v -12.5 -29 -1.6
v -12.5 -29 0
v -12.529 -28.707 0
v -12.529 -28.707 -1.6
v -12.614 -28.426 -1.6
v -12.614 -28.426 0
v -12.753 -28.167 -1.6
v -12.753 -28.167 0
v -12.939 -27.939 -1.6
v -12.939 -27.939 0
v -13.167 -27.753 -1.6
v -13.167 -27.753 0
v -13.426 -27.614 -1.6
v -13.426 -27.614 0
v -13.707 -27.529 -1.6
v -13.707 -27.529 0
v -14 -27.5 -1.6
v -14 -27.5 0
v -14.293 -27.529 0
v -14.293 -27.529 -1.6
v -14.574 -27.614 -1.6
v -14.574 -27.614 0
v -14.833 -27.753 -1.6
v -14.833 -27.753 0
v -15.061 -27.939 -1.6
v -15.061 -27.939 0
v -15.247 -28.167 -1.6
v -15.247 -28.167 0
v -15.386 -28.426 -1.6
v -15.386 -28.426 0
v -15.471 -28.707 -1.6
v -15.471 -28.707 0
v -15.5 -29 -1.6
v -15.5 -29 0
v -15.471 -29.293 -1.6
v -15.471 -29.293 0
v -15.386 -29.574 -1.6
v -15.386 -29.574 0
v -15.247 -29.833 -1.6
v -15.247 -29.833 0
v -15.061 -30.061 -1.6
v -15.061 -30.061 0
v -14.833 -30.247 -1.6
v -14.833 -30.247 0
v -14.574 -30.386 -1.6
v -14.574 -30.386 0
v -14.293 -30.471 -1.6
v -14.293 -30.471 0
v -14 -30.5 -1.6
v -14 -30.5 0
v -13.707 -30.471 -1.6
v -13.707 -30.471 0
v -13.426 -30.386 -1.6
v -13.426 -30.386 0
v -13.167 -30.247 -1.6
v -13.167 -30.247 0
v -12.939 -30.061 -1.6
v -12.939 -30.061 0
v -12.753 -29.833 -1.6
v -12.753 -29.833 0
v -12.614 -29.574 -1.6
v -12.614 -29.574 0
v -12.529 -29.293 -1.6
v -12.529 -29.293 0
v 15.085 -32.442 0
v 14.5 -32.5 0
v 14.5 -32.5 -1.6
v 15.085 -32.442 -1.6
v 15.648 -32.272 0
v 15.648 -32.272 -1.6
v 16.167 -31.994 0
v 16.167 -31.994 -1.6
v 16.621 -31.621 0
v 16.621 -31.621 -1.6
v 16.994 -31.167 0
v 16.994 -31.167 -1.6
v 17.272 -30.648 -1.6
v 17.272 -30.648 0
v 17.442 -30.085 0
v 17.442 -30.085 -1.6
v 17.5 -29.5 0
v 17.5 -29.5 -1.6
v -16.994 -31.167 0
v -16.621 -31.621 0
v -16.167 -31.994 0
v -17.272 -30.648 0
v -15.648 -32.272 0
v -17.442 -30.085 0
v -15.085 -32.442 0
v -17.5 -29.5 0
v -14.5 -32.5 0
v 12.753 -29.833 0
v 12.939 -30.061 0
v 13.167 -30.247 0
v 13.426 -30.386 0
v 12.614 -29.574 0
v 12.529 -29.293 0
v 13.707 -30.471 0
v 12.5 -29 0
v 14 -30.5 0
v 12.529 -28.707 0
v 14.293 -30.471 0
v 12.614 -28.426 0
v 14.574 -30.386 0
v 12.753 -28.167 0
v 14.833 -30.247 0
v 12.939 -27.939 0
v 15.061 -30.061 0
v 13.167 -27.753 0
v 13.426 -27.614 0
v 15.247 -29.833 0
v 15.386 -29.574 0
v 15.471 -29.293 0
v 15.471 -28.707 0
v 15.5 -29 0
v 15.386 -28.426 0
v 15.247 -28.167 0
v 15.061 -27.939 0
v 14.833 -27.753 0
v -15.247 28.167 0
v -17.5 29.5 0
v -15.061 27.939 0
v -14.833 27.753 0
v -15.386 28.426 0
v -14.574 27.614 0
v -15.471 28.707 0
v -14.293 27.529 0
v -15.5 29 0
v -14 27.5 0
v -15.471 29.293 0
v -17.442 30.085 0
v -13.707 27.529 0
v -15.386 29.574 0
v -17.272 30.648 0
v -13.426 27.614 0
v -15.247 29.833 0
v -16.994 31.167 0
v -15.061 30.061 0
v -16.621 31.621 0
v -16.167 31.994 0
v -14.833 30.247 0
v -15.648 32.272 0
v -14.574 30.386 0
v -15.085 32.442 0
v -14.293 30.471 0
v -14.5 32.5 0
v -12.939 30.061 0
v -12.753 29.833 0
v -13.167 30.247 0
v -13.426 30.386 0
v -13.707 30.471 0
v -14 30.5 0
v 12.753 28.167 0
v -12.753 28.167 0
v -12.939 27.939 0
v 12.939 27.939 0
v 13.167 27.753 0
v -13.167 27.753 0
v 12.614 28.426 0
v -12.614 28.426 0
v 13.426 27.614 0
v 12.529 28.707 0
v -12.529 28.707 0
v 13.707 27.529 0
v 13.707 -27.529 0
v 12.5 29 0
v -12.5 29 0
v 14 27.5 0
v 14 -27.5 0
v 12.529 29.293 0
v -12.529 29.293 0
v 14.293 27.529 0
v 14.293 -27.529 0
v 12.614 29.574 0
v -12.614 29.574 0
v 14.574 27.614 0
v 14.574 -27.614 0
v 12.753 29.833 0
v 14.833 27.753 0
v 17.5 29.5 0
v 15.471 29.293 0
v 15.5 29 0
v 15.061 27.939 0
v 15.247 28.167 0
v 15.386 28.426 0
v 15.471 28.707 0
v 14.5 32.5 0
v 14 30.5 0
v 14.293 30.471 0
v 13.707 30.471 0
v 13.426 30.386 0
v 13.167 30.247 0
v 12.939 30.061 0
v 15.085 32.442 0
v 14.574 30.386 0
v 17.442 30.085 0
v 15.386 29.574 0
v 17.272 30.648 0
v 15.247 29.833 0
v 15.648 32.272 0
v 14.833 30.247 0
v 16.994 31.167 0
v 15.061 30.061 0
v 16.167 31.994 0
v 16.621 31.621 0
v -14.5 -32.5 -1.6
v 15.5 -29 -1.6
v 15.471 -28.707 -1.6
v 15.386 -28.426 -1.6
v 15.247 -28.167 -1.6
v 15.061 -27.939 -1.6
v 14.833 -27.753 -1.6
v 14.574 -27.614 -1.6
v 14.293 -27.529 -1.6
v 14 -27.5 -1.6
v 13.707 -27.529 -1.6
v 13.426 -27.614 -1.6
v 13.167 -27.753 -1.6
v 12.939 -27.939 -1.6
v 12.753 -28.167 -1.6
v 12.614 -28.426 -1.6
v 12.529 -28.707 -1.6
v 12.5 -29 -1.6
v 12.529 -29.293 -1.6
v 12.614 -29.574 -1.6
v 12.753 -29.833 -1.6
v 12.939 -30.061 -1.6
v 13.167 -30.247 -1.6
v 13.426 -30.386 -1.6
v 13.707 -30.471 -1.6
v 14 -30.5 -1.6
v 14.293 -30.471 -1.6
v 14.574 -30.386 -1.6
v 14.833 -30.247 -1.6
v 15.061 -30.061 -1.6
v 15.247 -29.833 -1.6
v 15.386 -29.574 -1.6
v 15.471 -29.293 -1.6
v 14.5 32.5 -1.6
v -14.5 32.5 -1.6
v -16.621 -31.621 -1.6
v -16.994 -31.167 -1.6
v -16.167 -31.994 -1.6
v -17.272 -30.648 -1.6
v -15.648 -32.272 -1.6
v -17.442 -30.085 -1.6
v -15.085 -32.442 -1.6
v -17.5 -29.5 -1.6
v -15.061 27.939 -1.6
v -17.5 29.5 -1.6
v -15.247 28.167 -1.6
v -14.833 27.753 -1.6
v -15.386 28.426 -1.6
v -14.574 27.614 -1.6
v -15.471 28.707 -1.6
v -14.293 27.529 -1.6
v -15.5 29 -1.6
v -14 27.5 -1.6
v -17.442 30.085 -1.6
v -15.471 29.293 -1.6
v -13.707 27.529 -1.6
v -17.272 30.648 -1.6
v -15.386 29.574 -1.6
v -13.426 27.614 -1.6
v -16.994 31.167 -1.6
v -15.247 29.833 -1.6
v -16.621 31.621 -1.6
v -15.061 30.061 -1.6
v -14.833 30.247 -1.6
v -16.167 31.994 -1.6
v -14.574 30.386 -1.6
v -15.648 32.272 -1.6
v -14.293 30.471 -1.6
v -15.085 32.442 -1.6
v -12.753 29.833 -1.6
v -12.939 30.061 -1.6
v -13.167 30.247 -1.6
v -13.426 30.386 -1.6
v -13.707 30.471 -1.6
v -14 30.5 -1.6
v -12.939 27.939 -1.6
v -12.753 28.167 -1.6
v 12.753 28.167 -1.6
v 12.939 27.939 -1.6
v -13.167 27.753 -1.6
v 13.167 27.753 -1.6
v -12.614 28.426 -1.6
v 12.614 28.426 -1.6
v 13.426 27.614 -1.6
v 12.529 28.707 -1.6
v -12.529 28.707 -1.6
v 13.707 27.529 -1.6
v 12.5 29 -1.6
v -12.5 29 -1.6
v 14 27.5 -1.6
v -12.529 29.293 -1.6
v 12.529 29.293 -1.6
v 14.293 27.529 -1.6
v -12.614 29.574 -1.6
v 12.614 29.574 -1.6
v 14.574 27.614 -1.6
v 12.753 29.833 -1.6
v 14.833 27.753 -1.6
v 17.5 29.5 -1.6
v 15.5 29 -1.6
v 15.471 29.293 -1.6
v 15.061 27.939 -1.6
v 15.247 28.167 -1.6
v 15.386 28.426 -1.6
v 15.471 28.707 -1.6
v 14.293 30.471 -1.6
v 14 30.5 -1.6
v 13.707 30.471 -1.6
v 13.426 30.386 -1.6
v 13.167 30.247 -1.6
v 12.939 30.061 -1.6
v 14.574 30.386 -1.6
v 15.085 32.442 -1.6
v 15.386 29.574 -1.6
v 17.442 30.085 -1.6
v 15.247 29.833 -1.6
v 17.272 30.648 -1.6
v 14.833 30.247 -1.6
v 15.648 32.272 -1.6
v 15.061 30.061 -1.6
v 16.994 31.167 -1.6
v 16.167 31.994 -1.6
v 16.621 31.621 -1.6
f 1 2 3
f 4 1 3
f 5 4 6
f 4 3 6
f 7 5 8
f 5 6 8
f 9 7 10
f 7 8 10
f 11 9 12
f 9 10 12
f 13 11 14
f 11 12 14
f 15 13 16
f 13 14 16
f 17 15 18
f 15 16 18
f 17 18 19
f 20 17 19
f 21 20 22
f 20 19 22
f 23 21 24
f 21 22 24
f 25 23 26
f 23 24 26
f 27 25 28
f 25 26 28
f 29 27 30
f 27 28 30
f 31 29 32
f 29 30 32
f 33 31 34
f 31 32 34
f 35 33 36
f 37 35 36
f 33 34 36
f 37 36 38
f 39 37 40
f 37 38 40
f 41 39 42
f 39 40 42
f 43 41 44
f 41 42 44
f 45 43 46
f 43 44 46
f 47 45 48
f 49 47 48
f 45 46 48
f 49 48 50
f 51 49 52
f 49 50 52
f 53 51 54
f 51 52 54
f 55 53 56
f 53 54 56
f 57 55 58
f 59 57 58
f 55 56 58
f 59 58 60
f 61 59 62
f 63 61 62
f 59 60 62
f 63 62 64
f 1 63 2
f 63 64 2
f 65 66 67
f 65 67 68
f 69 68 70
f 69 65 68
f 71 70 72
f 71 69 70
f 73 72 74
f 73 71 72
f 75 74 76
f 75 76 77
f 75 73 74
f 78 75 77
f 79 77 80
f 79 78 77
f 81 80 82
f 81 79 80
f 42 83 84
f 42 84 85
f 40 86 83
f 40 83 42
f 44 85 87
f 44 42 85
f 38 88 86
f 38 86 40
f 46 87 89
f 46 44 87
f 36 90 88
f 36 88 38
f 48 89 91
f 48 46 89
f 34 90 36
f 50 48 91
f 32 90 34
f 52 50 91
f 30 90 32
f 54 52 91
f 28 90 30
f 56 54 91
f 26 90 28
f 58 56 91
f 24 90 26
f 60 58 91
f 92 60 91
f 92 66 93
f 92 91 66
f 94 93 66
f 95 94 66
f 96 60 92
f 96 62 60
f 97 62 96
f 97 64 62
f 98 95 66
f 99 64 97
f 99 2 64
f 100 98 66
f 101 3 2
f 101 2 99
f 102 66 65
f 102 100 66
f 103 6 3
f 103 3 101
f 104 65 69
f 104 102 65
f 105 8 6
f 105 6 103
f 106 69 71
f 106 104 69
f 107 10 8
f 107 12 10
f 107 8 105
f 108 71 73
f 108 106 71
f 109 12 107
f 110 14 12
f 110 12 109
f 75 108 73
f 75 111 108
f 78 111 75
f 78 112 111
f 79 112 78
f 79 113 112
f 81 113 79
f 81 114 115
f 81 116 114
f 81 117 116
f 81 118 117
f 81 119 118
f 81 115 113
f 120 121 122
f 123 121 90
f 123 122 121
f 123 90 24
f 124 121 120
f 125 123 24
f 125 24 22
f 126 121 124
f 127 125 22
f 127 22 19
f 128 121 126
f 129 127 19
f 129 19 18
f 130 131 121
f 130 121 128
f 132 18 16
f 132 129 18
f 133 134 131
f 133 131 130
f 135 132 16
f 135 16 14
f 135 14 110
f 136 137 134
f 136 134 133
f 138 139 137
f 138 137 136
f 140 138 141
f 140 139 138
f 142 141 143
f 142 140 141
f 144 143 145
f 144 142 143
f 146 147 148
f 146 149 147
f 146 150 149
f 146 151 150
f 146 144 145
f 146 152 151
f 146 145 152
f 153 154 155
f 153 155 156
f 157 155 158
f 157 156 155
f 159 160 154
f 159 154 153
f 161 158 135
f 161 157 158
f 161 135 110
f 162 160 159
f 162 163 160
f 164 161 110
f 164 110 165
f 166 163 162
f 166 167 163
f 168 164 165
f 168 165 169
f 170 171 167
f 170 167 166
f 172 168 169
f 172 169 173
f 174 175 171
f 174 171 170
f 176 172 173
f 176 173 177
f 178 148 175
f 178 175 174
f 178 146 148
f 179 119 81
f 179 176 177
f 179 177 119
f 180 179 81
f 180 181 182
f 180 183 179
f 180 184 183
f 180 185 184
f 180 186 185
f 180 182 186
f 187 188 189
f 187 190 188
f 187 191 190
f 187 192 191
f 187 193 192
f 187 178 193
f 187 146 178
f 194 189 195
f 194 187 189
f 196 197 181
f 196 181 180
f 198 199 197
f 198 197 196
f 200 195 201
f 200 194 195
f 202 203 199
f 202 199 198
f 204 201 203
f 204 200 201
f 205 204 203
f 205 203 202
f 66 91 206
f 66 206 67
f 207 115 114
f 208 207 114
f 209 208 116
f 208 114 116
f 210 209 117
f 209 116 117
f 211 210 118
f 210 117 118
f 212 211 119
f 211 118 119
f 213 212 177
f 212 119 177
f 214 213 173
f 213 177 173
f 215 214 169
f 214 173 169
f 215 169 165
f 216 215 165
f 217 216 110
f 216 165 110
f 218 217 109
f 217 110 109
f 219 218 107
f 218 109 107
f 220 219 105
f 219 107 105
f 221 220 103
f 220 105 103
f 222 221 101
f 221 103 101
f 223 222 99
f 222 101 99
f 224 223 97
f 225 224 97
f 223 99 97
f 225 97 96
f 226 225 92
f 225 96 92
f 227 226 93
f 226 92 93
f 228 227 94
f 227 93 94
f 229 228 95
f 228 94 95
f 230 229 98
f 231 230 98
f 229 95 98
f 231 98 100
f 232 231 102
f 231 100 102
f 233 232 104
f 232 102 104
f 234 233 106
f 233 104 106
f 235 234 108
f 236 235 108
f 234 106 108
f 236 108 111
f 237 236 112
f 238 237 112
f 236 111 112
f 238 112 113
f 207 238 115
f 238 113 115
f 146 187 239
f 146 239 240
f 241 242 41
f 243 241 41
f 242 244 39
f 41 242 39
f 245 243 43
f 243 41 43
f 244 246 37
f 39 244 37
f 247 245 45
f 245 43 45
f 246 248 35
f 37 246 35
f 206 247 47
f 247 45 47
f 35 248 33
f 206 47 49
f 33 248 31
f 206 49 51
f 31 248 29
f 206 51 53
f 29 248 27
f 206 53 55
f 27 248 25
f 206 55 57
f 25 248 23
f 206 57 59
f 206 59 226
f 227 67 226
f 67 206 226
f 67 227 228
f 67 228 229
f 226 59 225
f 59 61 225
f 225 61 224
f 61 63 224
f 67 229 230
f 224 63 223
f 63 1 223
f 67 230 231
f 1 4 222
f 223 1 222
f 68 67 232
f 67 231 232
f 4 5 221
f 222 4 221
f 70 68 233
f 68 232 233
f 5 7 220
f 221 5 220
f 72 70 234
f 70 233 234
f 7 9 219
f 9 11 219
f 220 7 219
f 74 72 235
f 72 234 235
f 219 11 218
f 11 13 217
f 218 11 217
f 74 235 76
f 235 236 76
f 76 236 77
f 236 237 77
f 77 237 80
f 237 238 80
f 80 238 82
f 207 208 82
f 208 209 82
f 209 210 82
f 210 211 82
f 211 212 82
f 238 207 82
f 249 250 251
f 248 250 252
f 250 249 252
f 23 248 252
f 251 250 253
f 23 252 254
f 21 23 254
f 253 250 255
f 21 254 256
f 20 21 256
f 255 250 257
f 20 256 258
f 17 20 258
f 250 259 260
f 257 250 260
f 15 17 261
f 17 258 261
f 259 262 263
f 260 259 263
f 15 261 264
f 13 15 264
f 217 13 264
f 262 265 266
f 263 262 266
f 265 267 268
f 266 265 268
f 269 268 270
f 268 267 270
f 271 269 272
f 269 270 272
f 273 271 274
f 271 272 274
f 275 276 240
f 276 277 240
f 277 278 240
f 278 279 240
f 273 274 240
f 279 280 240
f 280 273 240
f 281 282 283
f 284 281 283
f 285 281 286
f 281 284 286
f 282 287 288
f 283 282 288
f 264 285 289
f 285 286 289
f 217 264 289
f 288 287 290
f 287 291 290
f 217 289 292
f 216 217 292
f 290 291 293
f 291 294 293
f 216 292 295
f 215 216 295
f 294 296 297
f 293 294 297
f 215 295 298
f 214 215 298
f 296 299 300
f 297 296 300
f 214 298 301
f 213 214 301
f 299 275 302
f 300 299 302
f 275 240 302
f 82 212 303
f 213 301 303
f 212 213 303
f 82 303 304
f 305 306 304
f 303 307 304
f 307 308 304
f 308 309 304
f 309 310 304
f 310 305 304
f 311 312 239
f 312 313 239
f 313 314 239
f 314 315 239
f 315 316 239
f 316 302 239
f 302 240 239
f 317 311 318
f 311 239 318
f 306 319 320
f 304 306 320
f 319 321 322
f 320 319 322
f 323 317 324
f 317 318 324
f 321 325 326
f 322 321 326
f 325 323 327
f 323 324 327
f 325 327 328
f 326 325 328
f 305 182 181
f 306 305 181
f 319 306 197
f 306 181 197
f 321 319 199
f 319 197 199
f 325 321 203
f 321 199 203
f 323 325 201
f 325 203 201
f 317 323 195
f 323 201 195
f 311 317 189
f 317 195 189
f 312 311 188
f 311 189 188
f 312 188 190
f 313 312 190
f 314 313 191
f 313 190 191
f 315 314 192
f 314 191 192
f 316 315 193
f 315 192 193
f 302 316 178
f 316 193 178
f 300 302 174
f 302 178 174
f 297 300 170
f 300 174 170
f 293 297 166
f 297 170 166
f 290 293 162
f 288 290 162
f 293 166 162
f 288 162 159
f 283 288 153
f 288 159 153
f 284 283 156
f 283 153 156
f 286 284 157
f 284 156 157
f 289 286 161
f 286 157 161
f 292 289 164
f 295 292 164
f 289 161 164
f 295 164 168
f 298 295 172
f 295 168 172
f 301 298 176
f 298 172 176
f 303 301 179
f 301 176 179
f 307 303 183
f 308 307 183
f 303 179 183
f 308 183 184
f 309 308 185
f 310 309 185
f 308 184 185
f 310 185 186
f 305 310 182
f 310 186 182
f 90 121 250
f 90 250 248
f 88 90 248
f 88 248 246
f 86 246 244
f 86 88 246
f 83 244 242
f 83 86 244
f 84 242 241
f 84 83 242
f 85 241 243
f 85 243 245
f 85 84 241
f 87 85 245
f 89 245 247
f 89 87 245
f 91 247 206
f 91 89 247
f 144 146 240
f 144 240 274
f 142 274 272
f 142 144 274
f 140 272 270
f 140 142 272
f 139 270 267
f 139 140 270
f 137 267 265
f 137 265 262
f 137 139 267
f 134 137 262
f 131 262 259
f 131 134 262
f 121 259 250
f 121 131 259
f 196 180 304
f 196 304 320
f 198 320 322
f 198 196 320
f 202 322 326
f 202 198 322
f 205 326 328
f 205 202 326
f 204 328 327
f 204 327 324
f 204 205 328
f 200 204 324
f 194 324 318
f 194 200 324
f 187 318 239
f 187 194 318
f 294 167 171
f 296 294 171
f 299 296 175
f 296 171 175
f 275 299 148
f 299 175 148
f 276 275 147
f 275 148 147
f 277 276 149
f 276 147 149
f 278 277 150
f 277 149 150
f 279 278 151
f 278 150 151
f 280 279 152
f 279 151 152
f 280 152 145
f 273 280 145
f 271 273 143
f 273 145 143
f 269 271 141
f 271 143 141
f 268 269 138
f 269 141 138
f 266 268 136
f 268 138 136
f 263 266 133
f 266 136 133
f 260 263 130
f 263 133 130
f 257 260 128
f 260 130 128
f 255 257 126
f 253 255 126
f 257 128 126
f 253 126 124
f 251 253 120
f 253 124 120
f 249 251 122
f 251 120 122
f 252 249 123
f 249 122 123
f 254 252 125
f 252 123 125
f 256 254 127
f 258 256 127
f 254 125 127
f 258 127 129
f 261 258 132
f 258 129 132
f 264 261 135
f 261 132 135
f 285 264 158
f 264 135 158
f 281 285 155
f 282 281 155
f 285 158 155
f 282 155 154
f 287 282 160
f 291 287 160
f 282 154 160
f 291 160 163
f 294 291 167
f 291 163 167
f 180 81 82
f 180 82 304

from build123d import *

# Parameters (mm, degrees)
F0_R     = 1.5
F1_DEPTH = 1.6


with BuildPart() as f1:
    # F0 (on Top) → F1 (new body)
    with BuildSketch(Plane.XY):
        with BuildLine():
            ThreePointArc((17.5, 29.5), (16.62132, 31.62132), (14.5, 32.5))
            Line((14.5, 32.5), (-14.5, 32.5))
            ThreePointArc((-14.5, 32.5), (-16.62132, 31.62132), (-17.5, 29.5))
            Line((-17.5, 29.5), (-17.5, -29.5))
            ThreePointArc((-17.5, -29.5), (-16.62132, -31.62132), (-14.5, -32.5))
            Line((-14.5, -32.5), (14.5, -32.5))
            ThreePointArc((14.5, -32.5), (16.62132, -31.62132), (17.5, -29.5))
            Line((17.5, -29.5), (17.5, 29.5))
        make_face()
        with Locations((-14, -29)):
            Circle(F0_R, mode=Mode.SUBTRACT)
        with Locations((14, -29)):
            Circle(F0_R, mode=Mode.SUBTRACT)
        with Locations((-14, 29)):
            Circle(F0_R, mode=Mode.SUBTRACT)
        with Locations((14, 29)):
            Circle(F0_R, mode=Mode.SUBTRACT)
    extrude(amount=-F1_DEPTH)


solid = f1.part
